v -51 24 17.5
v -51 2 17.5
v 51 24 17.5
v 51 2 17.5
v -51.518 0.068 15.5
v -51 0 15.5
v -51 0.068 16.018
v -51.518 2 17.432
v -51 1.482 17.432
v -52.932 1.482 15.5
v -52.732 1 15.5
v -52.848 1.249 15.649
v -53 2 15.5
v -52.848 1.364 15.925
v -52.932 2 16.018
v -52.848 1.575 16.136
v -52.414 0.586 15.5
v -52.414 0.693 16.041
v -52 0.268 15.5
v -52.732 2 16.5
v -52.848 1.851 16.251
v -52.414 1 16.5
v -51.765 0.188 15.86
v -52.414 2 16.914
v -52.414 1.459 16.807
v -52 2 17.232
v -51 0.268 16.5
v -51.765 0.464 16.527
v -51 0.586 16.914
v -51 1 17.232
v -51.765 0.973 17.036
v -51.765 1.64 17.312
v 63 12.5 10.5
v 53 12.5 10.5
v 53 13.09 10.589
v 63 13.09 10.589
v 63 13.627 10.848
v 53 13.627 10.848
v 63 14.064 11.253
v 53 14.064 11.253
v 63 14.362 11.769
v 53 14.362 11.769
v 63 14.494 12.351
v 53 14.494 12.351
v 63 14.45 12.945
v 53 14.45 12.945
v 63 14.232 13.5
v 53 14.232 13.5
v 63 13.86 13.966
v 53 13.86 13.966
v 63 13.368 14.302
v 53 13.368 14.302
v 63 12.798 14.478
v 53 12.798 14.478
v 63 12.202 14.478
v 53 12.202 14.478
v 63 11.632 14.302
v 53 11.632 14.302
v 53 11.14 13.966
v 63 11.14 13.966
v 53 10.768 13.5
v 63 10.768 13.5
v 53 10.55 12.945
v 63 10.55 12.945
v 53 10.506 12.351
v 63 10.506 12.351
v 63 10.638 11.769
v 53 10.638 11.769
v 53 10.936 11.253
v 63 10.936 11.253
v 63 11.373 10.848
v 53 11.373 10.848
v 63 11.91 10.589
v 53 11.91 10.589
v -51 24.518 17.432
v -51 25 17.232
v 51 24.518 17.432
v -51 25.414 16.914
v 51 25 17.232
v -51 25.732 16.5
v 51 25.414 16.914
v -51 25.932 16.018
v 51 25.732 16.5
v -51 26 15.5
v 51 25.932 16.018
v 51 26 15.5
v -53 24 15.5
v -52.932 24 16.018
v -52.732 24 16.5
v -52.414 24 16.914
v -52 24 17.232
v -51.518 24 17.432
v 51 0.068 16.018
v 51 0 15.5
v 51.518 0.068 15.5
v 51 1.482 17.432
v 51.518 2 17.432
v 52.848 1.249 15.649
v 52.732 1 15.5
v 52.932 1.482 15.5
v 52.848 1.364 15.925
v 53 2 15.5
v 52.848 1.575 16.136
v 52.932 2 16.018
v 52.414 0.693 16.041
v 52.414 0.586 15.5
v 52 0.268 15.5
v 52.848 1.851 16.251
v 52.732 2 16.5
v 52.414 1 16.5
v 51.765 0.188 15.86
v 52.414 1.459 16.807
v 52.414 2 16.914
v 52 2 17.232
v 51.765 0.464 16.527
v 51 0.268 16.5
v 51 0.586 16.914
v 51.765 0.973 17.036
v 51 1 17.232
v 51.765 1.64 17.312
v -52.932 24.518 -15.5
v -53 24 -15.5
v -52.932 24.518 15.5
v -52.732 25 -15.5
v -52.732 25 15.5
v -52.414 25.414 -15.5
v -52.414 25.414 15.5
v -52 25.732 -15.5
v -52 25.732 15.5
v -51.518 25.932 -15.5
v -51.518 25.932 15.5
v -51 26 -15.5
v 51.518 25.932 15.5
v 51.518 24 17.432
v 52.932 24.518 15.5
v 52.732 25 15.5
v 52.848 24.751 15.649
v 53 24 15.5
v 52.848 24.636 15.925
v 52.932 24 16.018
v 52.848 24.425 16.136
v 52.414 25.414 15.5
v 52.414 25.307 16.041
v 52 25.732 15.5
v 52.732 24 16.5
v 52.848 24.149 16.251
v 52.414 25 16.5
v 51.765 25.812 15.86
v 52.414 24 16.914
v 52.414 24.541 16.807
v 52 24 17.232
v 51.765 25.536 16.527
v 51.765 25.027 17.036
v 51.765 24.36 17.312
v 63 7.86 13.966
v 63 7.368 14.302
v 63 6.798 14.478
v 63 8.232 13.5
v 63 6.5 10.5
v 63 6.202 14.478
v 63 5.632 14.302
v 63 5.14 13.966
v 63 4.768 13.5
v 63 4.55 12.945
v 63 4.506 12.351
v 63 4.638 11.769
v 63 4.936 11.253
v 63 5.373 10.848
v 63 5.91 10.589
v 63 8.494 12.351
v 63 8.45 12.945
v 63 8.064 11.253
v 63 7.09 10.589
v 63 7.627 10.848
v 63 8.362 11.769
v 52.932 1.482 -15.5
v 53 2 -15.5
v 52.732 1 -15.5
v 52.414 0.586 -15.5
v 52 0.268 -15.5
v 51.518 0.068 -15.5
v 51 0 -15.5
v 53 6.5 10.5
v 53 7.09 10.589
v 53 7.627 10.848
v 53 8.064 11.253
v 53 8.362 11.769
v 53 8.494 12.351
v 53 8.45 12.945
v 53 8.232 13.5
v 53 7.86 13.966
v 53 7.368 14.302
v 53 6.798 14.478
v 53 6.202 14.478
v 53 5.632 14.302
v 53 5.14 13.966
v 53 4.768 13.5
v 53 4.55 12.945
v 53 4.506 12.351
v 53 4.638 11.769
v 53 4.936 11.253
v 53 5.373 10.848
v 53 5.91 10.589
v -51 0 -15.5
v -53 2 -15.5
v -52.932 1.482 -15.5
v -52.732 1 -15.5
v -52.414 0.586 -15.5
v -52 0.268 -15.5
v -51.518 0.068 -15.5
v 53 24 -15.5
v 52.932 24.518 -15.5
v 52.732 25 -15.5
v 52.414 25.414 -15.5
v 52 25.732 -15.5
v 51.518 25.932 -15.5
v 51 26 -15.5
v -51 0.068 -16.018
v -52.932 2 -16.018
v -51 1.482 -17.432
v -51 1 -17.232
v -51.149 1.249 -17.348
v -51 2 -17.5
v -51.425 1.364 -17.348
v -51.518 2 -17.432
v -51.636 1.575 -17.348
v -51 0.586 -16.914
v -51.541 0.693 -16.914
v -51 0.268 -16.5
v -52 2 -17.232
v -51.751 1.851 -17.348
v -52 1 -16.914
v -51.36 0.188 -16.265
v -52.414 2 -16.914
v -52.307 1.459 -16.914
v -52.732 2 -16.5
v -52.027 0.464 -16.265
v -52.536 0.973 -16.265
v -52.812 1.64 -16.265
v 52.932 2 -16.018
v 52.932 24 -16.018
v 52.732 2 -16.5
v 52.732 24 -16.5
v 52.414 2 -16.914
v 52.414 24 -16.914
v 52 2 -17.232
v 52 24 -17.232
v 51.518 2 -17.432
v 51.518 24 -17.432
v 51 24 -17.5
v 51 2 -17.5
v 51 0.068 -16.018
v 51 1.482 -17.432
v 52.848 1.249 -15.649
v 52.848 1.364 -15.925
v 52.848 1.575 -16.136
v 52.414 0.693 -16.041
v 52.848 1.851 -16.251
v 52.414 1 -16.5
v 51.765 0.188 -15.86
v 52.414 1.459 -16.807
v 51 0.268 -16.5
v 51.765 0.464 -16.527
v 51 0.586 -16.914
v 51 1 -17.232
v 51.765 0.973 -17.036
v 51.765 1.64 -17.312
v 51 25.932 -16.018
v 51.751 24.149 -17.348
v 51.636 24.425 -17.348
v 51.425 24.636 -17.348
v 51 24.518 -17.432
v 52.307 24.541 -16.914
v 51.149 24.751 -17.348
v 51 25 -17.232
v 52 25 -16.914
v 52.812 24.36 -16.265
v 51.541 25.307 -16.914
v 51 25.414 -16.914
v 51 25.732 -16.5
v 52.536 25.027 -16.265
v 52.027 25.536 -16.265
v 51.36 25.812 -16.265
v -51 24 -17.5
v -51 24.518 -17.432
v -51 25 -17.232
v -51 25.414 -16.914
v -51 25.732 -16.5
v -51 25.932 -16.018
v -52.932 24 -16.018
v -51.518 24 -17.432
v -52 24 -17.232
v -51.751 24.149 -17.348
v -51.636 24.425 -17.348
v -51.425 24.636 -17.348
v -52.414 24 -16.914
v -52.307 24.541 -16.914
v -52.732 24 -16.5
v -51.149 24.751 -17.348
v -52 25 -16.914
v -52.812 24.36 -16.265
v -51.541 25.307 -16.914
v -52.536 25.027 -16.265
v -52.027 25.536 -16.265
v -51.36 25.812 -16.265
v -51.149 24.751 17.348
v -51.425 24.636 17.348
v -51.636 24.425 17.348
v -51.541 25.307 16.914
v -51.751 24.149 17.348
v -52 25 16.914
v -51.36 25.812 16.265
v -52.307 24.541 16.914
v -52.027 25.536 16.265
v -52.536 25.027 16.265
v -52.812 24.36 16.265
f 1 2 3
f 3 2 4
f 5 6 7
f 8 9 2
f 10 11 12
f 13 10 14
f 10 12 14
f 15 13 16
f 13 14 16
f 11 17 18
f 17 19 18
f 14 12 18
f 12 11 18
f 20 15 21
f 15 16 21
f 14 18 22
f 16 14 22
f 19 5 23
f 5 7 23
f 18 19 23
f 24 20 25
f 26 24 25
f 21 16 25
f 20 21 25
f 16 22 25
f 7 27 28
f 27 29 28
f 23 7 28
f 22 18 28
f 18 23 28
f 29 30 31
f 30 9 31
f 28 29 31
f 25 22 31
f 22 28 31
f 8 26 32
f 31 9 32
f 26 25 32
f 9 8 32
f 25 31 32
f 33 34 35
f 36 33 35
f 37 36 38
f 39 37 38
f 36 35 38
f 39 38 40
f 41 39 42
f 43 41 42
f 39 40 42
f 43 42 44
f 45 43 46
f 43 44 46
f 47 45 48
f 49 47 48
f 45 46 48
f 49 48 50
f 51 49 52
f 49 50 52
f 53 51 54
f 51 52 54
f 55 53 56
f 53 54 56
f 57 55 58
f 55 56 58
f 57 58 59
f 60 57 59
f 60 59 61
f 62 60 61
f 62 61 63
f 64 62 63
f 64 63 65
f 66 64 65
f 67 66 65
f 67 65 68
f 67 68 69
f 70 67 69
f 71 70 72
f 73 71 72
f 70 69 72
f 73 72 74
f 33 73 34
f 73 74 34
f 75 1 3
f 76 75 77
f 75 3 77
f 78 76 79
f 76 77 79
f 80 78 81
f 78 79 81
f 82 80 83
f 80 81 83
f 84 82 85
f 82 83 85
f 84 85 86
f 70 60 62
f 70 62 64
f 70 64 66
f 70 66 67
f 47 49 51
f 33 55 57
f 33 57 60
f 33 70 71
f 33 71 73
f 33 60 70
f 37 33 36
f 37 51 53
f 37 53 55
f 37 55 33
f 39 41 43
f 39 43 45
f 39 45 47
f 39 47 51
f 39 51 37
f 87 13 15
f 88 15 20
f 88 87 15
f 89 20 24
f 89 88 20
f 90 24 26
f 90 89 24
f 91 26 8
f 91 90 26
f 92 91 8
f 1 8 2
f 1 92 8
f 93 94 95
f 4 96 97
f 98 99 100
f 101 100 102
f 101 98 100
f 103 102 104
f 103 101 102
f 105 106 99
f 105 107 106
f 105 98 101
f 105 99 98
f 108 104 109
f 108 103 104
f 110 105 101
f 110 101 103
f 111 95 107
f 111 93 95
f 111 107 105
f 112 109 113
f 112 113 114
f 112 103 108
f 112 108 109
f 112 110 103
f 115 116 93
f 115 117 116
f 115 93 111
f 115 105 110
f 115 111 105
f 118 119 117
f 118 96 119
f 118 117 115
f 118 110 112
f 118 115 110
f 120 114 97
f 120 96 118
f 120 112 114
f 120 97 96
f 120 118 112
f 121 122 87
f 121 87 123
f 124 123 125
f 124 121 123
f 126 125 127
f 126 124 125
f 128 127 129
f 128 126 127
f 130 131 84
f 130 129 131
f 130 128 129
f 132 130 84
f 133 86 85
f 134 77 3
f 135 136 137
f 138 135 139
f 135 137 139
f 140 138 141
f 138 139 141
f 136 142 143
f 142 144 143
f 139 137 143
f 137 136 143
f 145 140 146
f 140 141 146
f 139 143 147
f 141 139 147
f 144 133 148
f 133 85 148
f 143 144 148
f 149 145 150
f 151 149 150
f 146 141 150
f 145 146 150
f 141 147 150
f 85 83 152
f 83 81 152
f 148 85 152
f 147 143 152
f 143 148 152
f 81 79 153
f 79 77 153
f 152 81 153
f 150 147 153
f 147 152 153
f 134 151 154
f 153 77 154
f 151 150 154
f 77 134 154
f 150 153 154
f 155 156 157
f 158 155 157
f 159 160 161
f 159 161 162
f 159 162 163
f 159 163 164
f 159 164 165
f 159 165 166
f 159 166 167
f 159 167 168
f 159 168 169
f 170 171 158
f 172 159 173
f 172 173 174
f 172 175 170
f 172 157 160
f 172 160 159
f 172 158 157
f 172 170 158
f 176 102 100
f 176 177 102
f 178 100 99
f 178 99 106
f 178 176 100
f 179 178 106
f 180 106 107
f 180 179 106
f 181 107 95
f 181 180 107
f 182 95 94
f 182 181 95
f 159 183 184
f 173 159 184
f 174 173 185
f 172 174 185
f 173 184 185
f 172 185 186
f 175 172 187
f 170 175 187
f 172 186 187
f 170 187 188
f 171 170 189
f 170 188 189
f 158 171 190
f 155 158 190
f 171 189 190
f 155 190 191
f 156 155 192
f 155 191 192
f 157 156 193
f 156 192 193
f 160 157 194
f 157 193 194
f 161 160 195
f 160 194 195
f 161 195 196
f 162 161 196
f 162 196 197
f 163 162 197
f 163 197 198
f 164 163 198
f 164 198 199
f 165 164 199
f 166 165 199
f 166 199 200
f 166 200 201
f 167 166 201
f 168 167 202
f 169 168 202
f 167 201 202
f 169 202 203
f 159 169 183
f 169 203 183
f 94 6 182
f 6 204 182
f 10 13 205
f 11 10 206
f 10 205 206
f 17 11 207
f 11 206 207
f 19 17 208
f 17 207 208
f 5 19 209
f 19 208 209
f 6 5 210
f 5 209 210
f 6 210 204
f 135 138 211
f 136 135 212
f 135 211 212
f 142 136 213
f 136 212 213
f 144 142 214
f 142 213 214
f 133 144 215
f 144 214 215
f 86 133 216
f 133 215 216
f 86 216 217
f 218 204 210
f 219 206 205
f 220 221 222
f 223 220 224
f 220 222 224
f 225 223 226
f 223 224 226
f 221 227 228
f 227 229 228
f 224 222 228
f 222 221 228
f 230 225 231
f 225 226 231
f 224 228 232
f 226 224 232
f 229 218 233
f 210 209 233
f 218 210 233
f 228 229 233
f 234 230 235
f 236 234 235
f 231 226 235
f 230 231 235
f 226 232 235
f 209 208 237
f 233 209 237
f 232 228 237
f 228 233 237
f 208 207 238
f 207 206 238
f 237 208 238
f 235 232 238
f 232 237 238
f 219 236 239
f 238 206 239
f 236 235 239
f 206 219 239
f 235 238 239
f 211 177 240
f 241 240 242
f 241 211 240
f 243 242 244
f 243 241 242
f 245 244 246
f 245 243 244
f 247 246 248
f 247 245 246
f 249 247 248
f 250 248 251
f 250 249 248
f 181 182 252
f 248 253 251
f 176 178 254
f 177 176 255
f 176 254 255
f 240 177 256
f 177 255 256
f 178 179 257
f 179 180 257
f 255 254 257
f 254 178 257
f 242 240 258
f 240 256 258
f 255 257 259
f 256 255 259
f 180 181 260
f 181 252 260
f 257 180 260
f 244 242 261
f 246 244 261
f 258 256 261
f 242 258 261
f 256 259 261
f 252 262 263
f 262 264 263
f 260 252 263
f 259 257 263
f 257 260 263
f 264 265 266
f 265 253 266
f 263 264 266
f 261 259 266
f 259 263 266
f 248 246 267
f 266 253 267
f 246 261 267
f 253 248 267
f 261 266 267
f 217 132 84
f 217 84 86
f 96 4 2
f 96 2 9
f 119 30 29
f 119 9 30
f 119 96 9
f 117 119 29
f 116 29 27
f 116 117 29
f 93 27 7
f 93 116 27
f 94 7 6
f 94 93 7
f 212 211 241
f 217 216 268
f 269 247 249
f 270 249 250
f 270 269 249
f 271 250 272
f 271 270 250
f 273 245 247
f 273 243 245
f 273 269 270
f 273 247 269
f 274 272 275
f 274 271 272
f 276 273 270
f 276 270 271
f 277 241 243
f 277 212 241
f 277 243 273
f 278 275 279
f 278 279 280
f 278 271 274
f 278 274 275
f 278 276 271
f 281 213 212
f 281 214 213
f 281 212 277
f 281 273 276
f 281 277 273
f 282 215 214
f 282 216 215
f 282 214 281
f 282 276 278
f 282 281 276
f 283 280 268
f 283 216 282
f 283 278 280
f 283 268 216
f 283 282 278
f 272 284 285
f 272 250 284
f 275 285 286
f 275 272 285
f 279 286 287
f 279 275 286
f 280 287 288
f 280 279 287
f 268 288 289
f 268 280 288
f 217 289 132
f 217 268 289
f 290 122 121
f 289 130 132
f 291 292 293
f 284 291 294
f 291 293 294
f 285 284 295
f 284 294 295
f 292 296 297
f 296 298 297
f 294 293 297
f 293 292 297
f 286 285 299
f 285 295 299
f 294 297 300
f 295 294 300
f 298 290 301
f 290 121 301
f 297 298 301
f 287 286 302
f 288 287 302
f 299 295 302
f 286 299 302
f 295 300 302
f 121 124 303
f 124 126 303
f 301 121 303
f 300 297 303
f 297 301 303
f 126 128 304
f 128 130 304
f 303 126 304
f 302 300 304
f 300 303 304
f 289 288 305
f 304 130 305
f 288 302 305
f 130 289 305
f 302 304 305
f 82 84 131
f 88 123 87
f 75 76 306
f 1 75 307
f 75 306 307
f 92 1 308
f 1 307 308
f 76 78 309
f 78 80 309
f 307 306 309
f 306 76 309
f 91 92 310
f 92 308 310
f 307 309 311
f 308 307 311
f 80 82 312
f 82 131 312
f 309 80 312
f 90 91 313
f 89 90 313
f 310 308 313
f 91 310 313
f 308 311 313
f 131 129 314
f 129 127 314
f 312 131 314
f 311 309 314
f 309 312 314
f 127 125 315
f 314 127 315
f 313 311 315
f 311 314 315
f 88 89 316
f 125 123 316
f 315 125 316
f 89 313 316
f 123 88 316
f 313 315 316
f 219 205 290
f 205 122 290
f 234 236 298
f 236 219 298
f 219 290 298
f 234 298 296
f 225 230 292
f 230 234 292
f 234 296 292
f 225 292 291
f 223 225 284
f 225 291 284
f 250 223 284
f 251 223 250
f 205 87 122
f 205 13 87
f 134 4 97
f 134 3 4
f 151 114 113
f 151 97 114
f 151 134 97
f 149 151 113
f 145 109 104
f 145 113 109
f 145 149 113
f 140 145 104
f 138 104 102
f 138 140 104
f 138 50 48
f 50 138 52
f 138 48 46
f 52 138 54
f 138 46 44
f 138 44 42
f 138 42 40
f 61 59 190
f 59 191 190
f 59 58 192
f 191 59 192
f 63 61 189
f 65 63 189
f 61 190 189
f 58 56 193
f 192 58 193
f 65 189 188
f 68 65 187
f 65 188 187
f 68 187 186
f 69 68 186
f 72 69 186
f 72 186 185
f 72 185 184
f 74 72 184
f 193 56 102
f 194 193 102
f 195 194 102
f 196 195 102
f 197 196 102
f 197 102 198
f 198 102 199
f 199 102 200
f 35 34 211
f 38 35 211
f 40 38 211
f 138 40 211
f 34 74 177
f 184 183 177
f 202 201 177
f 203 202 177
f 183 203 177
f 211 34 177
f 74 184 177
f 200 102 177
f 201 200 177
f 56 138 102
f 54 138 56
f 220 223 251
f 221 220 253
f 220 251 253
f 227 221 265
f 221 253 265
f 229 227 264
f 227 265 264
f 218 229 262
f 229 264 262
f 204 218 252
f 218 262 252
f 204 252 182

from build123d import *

# Parameters (mm, degrees)
SKETCH1_W           = 106
SKETCH1_H           = 35
BOSS_EXTRUDE1_DEPTH = 26
FILLET1_R           = 2
SKETCH2_R           = 2
BOSS_EXTRUDE2_DEPTH = 10


with BuildPart() as part:
    # Sketch1 → Boss-Extrude1 (new body)
    with BuildSketch(Plane(origin=(0, 0, 0), x_dir=(1, 0, 0), z_dir=(0, 1, 0))):
        Rectangle(SKETCH1_W, SKETCH1_H)
    extrude(amount=BOSS_EXTRUDE1_DEPTH)

    # Fillet1
    fillet1_edges = [part.edges().sort_by_distance(p)[0] for p in [
        (-53, 26, 0),
        (0, 26, 17.5),
        (53, 26, 0),
        (0, 0, 17.5),
        (-53, 0, 0),
        (0, 0, -17.5),
        (53, 0, 0),
        (53, 13, 17.5),
        (-53, 13, 17.5),
        (-53, 13, -17.5),
        (53, 13, -17.5),
        (0, 26, -17.5),
    ]]
    fillet(fillet1_edges, radius=FILLET1_R)

    # Sketch2 → Boss-Extrude2 (add)
    with BuildSketch(Plane(origin=(53, 0, 0), x_dir=(0, 0, -1), z_dir=(1, 0, 0))):
        with Locations((-12.5, 6.5)):
            Circle(SKETCH2_R)
        with Locations((-12.5, 12.5)):
            Circle(SKETCH2_R)
    extrude(amount=BOSS_EXTRUDE2_DEPTH)


solid = part.part
